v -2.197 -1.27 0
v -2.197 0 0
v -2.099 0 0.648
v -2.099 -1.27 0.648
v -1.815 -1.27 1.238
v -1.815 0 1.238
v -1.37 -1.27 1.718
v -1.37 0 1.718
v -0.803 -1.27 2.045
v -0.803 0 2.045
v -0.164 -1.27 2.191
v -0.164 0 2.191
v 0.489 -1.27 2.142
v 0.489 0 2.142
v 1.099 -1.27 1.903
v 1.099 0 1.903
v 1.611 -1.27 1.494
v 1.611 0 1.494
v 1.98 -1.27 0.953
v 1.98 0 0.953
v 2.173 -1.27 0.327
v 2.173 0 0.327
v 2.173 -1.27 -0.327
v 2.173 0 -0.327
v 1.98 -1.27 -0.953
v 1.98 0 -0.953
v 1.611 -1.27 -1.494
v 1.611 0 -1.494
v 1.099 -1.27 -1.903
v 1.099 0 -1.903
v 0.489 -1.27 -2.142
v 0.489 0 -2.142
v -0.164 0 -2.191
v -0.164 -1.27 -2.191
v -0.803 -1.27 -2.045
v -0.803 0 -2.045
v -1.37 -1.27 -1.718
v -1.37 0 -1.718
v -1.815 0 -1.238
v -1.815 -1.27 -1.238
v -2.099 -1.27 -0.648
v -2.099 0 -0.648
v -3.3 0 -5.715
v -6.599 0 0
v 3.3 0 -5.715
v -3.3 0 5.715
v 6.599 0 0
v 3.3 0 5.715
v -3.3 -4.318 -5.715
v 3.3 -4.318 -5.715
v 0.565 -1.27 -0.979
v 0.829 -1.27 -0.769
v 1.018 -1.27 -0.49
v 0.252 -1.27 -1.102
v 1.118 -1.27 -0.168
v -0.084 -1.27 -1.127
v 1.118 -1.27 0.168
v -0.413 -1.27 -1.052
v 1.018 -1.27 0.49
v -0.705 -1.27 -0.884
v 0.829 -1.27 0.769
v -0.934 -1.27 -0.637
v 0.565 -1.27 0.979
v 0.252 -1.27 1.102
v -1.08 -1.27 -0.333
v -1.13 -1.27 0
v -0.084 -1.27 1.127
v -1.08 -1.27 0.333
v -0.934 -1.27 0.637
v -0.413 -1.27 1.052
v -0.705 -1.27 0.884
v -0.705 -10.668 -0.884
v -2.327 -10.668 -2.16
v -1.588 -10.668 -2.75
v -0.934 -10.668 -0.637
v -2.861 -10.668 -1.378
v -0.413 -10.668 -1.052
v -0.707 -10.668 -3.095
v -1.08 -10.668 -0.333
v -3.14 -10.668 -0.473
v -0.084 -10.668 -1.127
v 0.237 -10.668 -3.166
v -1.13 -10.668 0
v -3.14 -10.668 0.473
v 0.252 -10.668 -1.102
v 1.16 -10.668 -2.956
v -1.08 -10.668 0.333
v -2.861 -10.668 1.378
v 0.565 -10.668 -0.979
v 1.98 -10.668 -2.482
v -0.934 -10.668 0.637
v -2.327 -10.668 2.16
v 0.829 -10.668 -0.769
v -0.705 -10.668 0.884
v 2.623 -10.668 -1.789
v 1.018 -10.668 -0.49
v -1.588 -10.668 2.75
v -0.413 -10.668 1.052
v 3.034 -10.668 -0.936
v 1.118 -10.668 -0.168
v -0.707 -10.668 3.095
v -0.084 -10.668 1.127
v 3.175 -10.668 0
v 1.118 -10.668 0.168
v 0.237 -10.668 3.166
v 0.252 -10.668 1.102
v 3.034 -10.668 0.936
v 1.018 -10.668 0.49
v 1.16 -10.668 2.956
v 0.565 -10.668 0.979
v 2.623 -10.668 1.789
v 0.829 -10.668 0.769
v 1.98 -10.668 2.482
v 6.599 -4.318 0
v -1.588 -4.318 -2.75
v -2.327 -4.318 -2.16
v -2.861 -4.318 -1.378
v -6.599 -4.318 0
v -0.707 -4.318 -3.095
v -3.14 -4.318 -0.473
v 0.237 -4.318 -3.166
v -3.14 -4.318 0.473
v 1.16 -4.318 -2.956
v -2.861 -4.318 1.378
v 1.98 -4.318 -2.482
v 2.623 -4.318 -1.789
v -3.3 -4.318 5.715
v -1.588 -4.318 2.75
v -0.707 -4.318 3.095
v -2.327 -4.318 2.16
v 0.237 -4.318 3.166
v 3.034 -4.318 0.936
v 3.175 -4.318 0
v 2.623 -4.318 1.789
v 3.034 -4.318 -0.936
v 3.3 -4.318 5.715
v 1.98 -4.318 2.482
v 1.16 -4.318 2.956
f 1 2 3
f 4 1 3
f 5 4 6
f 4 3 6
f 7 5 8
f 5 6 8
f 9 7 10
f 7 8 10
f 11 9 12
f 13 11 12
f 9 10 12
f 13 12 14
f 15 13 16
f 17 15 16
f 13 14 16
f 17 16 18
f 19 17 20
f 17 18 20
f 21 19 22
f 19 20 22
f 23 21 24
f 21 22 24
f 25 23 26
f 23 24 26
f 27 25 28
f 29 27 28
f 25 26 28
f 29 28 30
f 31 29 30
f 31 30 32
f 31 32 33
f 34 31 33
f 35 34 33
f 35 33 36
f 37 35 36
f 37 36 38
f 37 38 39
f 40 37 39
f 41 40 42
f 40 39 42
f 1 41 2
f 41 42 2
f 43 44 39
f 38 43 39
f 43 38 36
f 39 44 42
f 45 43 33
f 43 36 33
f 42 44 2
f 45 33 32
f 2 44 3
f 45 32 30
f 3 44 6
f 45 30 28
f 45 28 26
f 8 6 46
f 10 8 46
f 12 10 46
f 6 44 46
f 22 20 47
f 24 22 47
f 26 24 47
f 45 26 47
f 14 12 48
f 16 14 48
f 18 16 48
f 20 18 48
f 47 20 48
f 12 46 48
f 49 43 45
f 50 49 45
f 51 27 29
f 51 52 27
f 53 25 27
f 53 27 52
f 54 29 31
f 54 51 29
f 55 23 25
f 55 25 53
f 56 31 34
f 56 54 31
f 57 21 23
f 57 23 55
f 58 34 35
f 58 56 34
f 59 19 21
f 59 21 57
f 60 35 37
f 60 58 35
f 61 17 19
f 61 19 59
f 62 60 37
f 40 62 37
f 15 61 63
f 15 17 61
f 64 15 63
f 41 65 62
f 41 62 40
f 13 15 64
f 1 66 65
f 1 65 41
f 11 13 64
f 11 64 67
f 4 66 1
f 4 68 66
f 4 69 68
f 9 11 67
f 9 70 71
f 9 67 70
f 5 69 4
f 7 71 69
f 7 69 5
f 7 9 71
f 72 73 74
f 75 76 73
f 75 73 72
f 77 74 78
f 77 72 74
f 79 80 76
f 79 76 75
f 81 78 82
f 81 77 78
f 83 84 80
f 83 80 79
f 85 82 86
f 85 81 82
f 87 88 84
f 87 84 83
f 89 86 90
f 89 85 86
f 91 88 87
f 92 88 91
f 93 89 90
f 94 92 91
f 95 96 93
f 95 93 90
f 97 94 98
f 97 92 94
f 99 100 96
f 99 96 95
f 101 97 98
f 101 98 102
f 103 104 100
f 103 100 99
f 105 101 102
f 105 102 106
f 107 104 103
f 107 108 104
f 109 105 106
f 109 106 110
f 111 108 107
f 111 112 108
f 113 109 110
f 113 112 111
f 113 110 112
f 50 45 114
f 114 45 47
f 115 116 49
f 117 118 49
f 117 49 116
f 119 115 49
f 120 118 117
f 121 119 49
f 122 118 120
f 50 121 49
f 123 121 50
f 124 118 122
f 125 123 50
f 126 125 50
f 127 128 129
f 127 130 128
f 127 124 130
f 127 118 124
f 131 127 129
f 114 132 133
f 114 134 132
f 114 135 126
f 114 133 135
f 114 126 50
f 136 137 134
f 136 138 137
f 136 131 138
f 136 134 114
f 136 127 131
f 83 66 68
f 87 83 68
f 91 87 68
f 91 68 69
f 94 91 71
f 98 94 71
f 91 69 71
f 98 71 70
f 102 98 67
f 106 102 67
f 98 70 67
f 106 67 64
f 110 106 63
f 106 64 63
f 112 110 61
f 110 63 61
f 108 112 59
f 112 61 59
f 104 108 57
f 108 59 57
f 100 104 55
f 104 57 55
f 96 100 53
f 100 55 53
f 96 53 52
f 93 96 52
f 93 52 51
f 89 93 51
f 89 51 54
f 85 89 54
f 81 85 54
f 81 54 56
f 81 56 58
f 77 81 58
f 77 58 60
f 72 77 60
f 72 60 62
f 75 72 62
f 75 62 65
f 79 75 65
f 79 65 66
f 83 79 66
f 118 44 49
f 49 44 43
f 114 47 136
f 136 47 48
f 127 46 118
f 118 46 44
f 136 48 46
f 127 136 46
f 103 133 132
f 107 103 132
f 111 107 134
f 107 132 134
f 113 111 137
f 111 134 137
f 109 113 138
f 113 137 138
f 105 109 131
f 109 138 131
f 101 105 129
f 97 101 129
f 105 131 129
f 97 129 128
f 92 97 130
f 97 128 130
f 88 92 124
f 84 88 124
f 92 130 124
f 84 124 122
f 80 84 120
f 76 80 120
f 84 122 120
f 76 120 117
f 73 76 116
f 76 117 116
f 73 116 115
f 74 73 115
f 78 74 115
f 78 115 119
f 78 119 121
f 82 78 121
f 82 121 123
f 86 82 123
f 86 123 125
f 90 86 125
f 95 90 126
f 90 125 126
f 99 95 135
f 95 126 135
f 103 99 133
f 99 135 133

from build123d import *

# Parameters (mm, degrees)
F1_DEPTH = 4.318
F2_R     = 3.175
F2_R_2   = 1.1303
F3_DEPTH = 6.35
F4_R     = 2.1971
F5_DEPTH = 1.27
F6_R     = 1.1303
F7_DEPTH = 25.4


with BuildPart() as f1:
    # F0 (on Front) → F1 (new body)
    with BuildSketch(Plane.XZ):
        Polygon((3.299557, 5.715), (-3.299557, 5.715), (-6.599114, 0), (-3.299557, -5.715), (3.299557, -5.715), (6.599114, 0), align=None)
    extrude(amount=F1_DEPTH)

    # F2 (on face) → F3 (join)
    with BuildSketch(Plane.XZ.offset(4.318)):
        Circle(F2_R)
        Circle(F2_R_2, mode=Mode.SUBTRACT)
    extrude(amount=F3_DEPTH)

    # F4 (on face) → F5 (cut)
    with BuildSketch(Plane(origin=(0, 0, 0), x_dir=(-1, 0, 0), z_dir=(0, 1, 0))):
        Circle(F4_R)
    extrude(amount=-F5_DEPTH, mode=Mode.SUBTRACT)

    # F6 (on face) → F7 (cut)
    with BuildSketch(Plane(origin=(0, -1.27, 0), x_dir=(-1, 0, 0), z_dir=(0, 1, 0))):
        Circle(F6_R)
    extrude(amount=-F7_DEPTH, mode=Mode.SUBTRACT)


solid = f1.part
